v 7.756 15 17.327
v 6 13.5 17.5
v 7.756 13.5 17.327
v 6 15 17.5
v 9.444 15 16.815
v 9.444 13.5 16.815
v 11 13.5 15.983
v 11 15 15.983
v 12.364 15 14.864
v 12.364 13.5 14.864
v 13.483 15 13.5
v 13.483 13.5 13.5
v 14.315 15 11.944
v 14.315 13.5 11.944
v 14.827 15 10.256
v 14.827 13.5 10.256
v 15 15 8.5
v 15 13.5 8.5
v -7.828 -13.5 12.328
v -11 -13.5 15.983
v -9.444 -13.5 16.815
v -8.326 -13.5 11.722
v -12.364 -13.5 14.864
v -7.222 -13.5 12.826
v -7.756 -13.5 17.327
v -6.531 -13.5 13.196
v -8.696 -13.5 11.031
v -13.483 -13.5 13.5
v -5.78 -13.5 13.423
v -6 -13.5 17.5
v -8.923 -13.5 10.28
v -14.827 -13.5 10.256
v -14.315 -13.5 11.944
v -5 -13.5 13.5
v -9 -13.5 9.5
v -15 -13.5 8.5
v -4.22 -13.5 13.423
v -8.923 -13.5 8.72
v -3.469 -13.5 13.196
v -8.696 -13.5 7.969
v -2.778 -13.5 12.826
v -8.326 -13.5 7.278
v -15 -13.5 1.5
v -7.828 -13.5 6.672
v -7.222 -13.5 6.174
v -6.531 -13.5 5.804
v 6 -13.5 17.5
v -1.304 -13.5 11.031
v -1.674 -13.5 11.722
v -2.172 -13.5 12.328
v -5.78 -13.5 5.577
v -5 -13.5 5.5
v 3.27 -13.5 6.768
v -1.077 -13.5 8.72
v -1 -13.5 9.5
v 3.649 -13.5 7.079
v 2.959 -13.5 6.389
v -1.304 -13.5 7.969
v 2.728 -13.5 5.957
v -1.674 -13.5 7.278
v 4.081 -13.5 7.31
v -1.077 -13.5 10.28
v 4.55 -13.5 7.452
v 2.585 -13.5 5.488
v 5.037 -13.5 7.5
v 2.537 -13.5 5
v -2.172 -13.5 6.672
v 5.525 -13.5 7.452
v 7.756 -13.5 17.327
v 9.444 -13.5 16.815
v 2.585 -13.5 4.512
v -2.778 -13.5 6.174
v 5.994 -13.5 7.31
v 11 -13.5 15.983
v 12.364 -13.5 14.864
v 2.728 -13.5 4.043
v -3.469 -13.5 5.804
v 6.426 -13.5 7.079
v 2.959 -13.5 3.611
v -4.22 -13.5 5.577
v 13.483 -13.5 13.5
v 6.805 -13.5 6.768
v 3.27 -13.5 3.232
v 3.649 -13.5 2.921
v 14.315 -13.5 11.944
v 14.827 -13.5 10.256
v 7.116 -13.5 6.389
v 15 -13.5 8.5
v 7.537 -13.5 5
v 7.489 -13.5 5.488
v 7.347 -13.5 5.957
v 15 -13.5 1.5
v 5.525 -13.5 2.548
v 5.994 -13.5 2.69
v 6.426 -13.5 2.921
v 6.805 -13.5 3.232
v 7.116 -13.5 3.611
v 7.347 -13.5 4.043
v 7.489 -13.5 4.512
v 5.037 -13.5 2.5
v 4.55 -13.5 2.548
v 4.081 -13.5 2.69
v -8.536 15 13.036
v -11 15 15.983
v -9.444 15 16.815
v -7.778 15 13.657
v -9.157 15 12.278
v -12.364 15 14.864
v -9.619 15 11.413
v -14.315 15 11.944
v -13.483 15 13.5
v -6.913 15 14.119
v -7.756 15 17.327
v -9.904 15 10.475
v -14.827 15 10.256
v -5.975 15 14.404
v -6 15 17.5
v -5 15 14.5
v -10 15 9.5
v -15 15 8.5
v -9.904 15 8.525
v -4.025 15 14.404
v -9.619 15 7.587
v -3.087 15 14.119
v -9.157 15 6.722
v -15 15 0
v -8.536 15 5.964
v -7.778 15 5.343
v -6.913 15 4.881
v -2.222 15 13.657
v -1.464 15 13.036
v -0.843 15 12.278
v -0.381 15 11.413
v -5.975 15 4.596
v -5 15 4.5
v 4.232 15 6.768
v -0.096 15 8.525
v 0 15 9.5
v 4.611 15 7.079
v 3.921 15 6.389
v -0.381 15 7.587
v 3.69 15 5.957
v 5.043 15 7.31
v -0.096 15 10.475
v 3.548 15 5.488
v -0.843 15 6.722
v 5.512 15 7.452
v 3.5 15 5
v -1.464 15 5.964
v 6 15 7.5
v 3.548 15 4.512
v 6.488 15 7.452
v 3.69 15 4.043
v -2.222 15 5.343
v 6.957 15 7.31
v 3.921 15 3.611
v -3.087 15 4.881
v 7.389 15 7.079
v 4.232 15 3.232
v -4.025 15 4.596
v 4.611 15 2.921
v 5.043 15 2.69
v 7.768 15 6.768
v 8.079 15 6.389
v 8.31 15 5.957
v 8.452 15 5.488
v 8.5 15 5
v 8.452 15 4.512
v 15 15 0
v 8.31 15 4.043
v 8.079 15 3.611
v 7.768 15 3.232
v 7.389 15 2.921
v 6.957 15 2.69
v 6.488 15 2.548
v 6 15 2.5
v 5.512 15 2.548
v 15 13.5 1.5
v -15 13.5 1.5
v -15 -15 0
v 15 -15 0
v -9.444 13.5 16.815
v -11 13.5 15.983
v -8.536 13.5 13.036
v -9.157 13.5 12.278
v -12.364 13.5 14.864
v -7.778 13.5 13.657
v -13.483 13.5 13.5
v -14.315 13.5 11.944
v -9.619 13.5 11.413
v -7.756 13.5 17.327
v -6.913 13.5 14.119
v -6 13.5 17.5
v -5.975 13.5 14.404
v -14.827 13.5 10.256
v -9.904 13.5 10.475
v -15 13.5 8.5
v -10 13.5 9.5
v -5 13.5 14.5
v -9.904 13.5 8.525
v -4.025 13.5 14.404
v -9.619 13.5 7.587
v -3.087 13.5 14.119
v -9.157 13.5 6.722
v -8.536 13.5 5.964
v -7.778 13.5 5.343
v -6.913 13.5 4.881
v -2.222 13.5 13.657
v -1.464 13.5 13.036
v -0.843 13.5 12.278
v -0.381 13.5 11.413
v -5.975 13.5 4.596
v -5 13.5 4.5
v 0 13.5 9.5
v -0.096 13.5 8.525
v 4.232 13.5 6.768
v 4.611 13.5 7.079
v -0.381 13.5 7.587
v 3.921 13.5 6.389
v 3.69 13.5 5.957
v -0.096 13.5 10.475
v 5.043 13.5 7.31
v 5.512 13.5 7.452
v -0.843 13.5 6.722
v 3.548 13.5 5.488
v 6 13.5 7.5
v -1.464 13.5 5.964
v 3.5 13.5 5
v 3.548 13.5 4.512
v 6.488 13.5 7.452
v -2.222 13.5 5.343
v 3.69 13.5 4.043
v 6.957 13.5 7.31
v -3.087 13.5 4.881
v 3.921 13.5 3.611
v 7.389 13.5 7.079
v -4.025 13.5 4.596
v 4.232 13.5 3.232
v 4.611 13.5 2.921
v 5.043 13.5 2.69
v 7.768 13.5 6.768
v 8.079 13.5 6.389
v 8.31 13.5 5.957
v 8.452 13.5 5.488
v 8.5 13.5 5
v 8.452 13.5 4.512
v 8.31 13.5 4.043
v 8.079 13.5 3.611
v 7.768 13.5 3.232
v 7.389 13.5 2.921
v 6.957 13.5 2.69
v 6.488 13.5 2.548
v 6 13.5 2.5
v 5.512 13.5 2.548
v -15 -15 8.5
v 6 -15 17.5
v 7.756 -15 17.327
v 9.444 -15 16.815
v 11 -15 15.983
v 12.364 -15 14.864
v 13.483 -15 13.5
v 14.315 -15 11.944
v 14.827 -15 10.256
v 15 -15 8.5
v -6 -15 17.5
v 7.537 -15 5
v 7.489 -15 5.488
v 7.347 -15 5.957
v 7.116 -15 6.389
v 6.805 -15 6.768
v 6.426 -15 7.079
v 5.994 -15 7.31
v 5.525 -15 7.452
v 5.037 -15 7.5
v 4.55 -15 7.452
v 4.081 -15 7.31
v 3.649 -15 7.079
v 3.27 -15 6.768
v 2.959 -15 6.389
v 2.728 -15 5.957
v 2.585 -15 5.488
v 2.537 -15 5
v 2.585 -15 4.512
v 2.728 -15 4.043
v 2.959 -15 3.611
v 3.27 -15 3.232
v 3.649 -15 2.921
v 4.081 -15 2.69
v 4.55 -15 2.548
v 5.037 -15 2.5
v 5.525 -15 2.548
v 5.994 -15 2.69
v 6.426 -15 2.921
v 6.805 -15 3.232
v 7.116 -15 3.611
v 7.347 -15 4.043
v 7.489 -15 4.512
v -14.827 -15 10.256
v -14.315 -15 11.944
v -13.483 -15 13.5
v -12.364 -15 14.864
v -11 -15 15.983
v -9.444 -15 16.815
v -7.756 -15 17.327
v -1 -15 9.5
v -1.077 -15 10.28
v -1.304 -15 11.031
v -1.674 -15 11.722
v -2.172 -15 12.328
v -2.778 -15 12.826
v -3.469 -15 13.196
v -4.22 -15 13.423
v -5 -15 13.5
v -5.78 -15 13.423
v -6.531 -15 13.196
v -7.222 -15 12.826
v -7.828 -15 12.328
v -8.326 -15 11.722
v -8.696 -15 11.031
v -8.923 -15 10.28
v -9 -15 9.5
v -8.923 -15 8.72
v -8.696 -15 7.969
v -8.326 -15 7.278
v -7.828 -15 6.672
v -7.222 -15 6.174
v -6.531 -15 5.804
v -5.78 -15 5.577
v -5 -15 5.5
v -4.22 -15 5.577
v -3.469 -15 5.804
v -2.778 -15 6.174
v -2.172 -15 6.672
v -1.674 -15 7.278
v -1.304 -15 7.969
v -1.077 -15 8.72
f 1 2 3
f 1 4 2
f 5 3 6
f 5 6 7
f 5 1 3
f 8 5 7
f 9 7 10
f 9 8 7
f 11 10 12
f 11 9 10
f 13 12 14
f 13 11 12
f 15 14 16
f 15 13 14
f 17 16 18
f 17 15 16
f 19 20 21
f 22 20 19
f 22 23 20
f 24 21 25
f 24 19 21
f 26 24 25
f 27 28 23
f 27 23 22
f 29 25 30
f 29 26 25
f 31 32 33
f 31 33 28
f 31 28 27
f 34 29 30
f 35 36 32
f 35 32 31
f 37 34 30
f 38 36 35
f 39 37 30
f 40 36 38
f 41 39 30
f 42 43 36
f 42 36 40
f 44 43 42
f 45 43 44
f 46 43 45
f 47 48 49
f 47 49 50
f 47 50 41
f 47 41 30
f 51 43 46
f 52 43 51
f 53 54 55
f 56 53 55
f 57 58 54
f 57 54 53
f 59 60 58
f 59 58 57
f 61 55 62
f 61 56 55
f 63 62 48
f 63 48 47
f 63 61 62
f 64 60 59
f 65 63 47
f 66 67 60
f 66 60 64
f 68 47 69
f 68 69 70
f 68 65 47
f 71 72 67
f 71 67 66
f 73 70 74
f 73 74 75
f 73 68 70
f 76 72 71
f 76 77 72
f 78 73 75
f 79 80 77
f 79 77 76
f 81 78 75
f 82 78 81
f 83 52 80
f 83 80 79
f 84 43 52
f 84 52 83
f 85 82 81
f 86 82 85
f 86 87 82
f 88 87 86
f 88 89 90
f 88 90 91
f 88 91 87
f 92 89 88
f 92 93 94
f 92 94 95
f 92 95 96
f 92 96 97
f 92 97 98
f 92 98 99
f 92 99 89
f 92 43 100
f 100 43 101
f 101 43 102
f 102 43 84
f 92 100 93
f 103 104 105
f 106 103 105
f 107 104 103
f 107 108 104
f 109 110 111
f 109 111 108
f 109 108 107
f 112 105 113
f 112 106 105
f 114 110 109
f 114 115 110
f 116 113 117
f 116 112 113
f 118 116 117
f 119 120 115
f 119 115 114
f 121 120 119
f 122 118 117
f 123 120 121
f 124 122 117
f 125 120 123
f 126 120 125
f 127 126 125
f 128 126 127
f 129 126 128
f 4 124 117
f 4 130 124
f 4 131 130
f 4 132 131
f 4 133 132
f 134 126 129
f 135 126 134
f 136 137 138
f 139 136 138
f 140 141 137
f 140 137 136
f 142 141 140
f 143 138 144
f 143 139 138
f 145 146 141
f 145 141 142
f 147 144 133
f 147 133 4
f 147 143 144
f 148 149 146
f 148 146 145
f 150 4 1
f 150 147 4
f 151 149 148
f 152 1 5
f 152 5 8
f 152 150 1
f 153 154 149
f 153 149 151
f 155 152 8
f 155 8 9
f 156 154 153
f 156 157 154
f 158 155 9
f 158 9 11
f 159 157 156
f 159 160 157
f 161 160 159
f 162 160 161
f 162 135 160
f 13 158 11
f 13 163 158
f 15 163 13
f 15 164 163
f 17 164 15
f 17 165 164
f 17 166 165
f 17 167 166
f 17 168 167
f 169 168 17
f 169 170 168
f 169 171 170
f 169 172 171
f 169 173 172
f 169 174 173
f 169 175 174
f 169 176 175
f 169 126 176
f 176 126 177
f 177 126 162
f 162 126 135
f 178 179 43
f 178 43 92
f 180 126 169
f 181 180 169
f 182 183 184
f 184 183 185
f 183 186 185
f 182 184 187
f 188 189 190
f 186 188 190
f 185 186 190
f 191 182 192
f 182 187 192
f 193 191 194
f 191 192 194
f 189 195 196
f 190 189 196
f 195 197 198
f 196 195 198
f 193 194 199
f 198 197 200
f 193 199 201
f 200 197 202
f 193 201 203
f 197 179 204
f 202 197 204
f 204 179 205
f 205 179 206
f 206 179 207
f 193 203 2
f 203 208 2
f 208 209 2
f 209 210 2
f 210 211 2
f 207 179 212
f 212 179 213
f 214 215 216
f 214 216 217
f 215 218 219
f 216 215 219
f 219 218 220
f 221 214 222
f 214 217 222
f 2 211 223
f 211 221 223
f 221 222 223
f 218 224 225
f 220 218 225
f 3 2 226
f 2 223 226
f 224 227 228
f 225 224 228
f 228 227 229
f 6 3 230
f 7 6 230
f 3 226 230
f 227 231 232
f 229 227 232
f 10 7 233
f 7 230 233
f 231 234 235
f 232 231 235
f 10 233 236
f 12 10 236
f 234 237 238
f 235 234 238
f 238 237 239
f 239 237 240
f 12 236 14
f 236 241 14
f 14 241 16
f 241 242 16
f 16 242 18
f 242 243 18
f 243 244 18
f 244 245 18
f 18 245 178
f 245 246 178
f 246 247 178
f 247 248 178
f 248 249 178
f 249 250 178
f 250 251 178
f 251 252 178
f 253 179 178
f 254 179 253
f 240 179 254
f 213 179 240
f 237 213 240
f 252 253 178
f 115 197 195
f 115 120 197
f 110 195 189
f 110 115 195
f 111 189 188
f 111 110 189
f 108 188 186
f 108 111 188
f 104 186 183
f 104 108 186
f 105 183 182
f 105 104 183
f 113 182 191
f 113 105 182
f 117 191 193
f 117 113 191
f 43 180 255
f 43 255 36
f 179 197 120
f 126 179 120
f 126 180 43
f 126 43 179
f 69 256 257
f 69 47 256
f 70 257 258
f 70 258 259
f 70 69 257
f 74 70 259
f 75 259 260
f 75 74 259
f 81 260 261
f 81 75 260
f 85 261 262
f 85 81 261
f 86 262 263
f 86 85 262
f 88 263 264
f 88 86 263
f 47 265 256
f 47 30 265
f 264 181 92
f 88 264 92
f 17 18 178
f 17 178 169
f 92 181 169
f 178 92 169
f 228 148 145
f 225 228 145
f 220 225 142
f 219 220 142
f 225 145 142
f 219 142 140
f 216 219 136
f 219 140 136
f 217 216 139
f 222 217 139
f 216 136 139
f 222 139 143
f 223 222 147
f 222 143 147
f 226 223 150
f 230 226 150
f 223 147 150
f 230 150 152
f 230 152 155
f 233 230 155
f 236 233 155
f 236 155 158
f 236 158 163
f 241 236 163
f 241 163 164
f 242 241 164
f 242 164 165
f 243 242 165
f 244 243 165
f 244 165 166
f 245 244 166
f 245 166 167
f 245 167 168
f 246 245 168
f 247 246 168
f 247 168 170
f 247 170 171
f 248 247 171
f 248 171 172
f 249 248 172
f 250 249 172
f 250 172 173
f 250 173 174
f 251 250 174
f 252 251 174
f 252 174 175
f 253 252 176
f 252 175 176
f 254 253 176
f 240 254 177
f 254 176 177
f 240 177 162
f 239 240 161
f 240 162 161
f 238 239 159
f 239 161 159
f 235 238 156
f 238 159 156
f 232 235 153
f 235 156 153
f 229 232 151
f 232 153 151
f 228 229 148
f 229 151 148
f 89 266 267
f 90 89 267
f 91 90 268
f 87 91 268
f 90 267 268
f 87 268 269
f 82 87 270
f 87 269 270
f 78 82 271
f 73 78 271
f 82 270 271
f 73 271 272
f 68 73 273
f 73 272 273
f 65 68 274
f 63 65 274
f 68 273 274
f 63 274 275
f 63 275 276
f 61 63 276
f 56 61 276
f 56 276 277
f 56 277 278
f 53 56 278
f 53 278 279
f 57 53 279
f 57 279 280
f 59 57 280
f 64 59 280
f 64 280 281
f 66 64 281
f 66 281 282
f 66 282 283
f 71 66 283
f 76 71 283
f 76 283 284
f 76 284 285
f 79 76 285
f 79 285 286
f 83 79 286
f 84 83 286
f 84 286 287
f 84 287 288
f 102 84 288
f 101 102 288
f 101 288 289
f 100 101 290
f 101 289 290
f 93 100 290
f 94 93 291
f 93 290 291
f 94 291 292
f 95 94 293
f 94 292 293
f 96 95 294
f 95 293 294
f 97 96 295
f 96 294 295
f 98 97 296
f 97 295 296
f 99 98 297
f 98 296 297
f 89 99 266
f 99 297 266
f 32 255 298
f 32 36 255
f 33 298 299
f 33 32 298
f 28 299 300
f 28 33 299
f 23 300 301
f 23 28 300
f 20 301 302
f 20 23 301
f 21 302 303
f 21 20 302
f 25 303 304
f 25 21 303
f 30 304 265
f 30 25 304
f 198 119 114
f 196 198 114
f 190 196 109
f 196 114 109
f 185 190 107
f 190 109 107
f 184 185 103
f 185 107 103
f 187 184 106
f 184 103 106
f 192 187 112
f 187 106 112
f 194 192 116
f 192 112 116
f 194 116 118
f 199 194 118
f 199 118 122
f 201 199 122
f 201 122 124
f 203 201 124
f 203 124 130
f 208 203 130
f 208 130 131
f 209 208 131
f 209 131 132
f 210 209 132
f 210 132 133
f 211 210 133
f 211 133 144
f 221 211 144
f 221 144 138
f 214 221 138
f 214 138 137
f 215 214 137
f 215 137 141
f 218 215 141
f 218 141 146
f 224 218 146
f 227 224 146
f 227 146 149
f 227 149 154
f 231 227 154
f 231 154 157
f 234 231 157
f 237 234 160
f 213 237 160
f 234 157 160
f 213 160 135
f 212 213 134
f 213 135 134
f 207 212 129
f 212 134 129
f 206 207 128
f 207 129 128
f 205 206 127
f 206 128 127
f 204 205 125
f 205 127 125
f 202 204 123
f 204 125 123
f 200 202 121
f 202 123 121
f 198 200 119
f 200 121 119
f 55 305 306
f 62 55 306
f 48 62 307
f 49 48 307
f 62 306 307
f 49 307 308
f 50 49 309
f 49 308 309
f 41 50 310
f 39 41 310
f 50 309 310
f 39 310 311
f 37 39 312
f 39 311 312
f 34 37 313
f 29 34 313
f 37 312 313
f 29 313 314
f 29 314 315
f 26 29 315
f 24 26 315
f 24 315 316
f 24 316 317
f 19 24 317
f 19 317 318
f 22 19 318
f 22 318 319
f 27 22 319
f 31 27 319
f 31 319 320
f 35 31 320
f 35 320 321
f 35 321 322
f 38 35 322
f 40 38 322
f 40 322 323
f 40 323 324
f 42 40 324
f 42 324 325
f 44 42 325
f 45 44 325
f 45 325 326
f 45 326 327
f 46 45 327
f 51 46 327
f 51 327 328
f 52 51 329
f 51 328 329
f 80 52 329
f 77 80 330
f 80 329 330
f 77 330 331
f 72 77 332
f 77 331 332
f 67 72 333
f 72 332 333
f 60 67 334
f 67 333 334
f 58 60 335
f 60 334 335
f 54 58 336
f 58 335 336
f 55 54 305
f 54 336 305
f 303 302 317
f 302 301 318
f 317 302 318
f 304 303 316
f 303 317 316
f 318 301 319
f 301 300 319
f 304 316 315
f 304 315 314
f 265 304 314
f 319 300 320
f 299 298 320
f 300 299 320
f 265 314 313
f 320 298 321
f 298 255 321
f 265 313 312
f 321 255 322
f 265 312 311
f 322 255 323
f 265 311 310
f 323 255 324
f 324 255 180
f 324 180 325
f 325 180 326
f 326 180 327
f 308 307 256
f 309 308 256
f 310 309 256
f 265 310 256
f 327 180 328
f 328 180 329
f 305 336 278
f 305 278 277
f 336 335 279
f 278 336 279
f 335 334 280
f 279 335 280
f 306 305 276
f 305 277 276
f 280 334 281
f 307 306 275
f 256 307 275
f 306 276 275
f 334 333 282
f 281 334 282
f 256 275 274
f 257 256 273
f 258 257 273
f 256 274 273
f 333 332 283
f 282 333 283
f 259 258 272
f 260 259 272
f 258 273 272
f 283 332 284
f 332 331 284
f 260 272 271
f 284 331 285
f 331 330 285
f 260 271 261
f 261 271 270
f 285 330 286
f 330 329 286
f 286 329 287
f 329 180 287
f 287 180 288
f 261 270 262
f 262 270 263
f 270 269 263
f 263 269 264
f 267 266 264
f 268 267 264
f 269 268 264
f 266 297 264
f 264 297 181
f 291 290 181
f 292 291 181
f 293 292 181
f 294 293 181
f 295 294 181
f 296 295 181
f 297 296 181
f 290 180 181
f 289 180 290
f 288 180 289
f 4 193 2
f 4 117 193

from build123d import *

# Parameters (mm, degrees)
F0_W     = 30
F0_H     = 30
F1_DEPTH = 1.5
F2_W     = 30
F2_H     = 1.5
F3_DEPTH = 16
F4_W     = 30
F4_H     = 1.5
F5_DEPTH = 16
F6_R     = 4
F6_R_2   = 2.5
F7_DEPTH = 25
F8_R     = 5
F8_R_2   = 2.5
F9_DEPTH = 25
F10_R    = 9


with BuildPart() as f1:
    # F0 (on Top) → F1 (new body)
    with BuildSketch(Plane.XY):
        Rectangle(F0_W, F0_H)
    extrude(amount=F1_DEPTH)

    # F2 (on face) → F3 (join)
    with BuildSketch(Plane.XY.offset(1.5)):
        with Locations((0, 14.25)):
            Rectangle(F2_W, F2_H)
    extrude(amount=F3_DEPTH)

    # F4 (on face) → F5 (join)
    with BuildSketch(Plane.XY.offset(1.5)):
        with Locations((0, -14.25)):
            Rectangle(F4_W, F4_H)
    extrude(amount=F5_DEPTH)

    # F6 (on face) → F7 (cut)
    with BuildSketch(Plane.XZ.offset(15)):
        with Locations((-5, 9.5)):
            Circle(F6_R)
        with Locations((5.03743, 5)):
            Circle(F6_R_2)
    extrude(amount=-F7_DEPTH, mode=Mode.SUBTRACT)

    # F8 (on face) → F9 (cut)
    with BuildSketch(Plane(origin=(0, 15, 0), x_dir=(-1, 0, 0), z_dir=(0, 1, 0))):
        with Locations((5, 9.5)):
            Circle(F8_R)
        with Locations((-6, 5)):
            Circle(F8_R_2)
    extrude(amount=-F9_DEPTH, mode=Mode.SUBTRACT)

    # F10
    f10_edges = [f1.edges().sort_by_distance(p)[0] for p in [
        (15, 14.25, 17.5),
        (15, -14.25, 17.5),
        (-15, -14.25, 17.5),
        (-15, 14.25, 17.5),
    ]]
    fillet(f10_edges, radius=F10_R)


solid = f1.part
